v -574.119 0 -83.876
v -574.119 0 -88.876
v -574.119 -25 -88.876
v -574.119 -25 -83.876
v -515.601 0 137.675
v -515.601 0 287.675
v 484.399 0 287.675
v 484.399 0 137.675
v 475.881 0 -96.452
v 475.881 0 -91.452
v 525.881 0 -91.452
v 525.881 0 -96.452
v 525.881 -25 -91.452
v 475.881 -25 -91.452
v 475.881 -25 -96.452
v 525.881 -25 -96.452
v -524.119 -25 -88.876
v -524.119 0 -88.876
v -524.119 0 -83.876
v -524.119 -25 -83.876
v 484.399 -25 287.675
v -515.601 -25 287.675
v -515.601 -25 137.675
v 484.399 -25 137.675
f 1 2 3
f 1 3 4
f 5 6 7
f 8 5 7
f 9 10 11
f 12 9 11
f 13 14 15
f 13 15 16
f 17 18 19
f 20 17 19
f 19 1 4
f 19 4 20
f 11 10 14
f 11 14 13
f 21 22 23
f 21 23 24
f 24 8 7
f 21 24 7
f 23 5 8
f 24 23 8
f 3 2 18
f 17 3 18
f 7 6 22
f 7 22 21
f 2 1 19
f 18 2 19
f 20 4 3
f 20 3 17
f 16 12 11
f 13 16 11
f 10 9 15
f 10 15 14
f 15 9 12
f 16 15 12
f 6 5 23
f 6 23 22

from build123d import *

# Parameters (mm, degrees)
F0_W     = 50
F0_H     = 5
F1_DEPTH = 25
F2_W     = 1000
F2_H     = 150
F3_DEPTH = 25


with BuildPart() as f1:
    # F0 (on Front) → F1 (new body)
    with BuildSketch(Plane.XZ):
        with Locations((-549.1185657559, -86.3759217312)):
            Rectangle(F0_W, F0_H)
    extrude(amount=F1_DEPTH)


with BuildPart() as f1b:
    # F0 (on Front) → F1, piece 2 (new body)
    with BuildSketch(Plane.XZ):
        with Locations((500.8814342441, -93.9516803368)):
            Rectangle(F0_W, F0_H)
    extrude(amount=F1_DEPTH)


with BuildPart() as f3:
    # F2 (on Front) → F3 (new body)
    with BuildSketch(Plane.XZ):
        with Locations((-15.6014859676, 212.6752244859)):
            Rectangle(F2_W, F2_H)
    extrude(amount=F3_DEPTH)


solid = Compound([f1.part, f1b.part, f3.part])
